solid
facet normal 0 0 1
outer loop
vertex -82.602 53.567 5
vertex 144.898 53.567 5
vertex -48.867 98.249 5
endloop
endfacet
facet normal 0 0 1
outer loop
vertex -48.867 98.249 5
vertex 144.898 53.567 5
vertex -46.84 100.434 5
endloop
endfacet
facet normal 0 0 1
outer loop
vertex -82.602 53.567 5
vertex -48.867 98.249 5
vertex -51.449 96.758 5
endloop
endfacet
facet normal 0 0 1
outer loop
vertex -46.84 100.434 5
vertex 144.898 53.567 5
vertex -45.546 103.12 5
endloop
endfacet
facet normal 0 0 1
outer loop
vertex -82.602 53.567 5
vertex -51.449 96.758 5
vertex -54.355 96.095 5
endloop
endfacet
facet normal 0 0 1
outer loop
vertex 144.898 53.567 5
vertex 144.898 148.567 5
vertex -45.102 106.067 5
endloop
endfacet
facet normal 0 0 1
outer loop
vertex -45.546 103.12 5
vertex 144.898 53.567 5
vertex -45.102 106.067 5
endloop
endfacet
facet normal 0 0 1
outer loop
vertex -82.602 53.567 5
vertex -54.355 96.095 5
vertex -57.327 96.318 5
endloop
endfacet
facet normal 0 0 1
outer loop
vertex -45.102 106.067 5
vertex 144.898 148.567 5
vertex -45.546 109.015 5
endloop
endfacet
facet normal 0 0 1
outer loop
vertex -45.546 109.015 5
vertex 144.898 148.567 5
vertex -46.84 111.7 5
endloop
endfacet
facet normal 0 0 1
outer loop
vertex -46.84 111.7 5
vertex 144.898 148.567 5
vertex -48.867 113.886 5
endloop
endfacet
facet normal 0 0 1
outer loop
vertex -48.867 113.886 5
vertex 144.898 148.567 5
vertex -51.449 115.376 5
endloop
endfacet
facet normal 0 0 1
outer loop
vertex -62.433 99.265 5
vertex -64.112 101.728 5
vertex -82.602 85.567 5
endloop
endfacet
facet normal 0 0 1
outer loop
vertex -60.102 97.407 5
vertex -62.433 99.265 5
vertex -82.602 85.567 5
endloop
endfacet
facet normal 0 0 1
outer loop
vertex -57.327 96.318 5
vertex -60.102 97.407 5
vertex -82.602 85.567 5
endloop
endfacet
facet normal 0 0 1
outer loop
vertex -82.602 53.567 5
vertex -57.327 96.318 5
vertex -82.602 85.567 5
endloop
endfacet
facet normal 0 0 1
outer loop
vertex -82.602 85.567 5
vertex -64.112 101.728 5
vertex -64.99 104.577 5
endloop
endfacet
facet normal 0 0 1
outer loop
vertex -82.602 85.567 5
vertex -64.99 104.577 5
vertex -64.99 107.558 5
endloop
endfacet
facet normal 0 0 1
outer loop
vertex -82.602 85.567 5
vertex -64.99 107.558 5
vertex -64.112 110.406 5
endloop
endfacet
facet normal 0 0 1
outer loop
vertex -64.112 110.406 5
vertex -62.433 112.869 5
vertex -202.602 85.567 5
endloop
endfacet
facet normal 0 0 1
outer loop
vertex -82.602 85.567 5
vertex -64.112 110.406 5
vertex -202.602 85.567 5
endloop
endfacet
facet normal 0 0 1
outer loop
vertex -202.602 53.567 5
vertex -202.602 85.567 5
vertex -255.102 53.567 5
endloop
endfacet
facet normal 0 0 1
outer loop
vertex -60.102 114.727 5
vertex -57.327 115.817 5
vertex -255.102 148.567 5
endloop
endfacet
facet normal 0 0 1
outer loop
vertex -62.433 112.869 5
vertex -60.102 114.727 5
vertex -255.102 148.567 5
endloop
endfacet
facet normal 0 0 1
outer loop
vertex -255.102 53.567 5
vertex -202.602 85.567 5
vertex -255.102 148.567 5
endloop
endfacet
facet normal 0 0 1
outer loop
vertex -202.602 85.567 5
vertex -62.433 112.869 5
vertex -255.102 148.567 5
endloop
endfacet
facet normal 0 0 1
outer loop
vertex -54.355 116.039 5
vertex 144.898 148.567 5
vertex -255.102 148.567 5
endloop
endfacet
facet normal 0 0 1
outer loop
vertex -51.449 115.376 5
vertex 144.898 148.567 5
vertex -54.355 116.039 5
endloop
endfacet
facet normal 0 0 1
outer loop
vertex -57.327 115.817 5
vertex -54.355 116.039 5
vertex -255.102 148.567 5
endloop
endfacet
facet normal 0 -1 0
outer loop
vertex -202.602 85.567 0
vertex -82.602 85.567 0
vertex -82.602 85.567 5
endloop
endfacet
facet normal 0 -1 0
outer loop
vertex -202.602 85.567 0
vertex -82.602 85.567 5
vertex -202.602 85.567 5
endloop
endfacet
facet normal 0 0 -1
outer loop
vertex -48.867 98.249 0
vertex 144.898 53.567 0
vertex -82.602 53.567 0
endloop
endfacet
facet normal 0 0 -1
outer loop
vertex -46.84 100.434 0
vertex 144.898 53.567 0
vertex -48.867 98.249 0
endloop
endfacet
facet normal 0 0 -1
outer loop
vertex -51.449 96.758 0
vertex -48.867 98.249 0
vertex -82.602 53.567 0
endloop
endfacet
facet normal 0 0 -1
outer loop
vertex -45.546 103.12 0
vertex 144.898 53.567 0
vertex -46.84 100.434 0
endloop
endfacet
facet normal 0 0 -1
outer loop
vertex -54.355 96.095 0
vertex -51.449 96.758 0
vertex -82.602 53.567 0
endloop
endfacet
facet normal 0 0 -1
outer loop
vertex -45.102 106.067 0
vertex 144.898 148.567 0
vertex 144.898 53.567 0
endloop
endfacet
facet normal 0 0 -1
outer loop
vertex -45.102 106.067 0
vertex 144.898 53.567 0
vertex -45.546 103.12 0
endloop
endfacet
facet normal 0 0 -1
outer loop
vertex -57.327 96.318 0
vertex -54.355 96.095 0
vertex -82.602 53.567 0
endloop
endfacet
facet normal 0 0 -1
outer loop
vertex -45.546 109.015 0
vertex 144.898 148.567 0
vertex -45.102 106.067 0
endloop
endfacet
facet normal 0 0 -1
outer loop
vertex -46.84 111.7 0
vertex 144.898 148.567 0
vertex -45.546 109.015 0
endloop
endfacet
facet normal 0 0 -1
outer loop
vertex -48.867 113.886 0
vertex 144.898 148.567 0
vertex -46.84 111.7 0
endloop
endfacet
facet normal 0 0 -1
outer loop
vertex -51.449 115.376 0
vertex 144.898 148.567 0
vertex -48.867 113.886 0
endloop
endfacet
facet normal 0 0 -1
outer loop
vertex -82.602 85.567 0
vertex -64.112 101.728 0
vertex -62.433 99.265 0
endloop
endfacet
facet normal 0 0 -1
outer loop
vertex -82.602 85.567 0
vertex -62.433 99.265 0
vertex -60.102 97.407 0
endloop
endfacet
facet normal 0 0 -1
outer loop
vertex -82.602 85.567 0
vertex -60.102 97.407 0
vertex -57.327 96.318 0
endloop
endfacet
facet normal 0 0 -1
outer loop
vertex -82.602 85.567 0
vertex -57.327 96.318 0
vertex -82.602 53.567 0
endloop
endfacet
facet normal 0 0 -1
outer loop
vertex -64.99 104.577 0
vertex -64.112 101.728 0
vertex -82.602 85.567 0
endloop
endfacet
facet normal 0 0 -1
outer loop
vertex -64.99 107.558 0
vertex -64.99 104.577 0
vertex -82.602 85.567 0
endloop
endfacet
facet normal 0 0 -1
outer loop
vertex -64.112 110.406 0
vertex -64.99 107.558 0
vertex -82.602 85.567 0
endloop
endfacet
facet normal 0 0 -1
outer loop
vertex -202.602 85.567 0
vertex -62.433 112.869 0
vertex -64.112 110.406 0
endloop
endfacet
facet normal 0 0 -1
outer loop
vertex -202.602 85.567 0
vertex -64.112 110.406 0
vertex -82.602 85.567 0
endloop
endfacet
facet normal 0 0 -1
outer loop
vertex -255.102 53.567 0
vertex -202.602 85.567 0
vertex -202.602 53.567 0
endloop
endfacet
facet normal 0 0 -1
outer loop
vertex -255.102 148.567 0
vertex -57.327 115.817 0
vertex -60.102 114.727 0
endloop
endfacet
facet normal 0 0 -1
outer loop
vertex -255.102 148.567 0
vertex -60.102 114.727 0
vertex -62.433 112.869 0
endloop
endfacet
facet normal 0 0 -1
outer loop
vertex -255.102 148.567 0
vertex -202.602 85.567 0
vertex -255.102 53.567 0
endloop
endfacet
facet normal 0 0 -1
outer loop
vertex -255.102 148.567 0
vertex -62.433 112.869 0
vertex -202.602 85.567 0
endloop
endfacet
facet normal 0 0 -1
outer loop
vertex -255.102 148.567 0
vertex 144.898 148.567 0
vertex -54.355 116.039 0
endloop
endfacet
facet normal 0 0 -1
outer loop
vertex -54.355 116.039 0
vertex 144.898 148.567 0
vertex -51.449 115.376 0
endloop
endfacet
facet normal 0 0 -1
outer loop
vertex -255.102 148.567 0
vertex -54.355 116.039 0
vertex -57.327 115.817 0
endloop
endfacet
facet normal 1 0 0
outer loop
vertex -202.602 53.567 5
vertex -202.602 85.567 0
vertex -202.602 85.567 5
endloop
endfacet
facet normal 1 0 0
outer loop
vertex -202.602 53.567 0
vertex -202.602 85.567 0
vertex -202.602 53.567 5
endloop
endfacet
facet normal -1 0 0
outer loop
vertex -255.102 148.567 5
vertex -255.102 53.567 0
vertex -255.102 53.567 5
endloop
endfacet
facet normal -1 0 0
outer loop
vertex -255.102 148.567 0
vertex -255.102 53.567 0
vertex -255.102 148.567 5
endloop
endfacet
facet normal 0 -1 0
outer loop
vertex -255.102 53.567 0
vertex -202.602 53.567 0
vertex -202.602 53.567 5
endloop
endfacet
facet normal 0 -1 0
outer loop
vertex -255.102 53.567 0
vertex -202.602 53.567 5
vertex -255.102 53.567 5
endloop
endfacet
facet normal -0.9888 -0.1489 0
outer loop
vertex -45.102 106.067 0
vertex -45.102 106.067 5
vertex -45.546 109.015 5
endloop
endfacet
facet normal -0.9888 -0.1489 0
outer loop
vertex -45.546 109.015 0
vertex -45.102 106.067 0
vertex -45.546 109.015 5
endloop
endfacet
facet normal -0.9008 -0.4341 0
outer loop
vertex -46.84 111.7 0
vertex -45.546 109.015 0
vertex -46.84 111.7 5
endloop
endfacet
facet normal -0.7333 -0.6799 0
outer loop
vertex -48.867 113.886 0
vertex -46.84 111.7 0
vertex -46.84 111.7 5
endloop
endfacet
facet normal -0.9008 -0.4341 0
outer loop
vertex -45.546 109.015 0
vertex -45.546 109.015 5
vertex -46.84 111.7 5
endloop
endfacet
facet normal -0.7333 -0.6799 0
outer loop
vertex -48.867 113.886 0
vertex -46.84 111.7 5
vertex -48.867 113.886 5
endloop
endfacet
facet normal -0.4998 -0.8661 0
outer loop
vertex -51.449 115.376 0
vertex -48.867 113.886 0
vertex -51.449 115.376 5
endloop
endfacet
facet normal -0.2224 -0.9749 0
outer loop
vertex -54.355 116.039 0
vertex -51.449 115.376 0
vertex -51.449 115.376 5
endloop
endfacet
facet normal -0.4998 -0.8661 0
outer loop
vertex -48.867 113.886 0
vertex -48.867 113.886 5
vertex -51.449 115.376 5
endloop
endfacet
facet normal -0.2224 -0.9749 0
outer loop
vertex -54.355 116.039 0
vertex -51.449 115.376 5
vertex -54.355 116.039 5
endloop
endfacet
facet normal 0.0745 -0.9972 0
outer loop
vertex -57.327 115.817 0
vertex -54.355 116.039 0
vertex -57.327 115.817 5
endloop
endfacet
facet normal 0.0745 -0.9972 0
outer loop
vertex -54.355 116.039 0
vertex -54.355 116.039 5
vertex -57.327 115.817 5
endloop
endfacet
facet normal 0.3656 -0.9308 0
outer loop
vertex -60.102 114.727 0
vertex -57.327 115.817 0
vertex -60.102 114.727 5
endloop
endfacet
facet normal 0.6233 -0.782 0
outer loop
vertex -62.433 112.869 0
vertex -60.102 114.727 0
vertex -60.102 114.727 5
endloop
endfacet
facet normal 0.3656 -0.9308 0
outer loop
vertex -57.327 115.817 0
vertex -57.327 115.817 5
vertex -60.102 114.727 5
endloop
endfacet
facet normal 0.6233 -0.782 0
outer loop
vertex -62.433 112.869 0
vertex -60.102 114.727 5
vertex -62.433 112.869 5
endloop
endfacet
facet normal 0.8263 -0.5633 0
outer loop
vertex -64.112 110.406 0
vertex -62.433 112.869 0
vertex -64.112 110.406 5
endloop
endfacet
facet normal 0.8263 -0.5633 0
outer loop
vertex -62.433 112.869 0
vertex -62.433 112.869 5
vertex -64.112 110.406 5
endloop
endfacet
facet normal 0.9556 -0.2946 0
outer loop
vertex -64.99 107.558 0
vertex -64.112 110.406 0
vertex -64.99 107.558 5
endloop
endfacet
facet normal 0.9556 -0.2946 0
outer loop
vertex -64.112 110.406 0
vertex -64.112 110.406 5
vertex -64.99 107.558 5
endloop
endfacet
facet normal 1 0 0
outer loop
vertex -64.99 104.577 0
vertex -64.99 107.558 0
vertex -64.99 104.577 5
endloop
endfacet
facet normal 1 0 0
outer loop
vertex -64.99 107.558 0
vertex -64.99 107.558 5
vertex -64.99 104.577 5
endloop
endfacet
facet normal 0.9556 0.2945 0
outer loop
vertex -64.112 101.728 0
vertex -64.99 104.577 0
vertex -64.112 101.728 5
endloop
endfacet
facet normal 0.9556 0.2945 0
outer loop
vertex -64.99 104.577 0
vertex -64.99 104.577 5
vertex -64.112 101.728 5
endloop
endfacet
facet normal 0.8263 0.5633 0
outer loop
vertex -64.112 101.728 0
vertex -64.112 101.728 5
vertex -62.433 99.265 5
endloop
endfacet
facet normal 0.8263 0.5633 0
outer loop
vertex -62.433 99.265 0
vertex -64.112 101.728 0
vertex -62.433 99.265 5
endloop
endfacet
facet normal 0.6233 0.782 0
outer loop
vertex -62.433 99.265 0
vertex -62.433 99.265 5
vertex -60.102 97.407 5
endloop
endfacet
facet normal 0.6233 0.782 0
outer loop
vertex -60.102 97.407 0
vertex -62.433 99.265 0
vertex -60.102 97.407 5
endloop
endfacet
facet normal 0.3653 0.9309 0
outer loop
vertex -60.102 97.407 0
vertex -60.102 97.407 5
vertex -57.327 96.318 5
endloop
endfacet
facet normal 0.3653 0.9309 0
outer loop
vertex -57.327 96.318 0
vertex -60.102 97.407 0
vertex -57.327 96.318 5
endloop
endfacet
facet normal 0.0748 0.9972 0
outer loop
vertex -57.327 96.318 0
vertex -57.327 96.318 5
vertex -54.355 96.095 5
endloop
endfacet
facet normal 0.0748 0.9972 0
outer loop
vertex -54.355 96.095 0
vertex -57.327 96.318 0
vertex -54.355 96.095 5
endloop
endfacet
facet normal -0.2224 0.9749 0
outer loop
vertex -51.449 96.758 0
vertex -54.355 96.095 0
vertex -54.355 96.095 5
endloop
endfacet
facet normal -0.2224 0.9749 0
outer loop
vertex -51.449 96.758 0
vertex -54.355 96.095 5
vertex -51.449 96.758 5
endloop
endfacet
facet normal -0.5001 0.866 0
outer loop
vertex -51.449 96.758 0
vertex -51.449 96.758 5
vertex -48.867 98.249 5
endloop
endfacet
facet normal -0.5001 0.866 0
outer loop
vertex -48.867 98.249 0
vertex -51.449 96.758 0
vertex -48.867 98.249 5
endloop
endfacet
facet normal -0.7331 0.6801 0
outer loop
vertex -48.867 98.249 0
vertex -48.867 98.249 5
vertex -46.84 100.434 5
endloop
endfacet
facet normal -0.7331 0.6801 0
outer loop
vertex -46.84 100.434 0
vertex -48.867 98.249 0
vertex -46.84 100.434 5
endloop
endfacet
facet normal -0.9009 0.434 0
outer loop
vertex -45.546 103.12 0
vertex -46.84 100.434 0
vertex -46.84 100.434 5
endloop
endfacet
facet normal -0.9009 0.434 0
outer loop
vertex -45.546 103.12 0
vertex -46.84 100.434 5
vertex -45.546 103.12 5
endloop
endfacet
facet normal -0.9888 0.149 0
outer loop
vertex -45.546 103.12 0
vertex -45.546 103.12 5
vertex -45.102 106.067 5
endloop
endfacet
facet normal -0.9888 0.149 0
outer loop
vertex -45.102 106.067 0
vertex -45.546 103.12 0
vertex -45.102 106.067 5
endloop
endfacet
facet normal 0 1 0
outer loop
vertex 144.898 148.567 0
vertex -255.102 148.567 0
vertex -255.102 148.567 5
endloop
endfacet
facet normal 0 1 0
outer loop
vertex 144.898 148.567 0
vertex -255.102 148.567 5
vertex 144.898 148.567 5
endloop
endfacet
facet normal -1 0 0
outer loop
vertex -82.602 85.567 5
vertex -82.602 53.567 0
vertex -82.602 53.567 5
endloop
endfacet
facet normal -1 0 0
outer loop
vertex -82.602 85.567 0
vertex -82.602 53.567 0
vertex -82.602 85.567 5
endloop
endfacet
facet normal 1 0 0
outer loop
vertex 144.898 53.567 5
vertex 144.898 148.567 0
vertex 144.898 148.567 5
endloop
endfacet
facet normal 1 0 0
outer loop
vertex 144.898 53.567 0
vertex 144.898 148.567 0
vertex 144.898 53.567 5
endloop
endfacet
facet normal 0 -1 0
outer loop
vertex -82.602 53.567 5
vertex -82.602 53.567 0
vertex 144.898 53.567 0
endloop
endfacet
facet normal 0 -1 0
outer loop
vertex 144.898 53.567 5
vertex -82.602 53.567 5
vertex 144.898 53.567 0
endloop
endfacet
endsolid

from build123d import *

# Parameters (mm, degrees)
EXTRUDE_1_DEPTH     = 5
SKETCH_2_R          = 10
CUT_EXTRUDE_1_DEPTH = 10


with BuildPart() as part:
    # 草图1 → 凸台-拉伸1 (new body)
    with BuildSketch(Plane.XY):
        Polygon((-255.102040816, 148.567224711), (144.897959184, 148.567224711), (144.897959184, 53.567224711), (92.397959184, 53.567224711), (-27.602040816, 53.567224711), (-82.602040816, 53.567224711), (-82.602040816, 85.567224711), (-202.602040816, 85.567224711), (-202.602040816, 53.567224711), (-255.102040816, 53.567224711), align=None)
    extrude(amount=EXTRUDE_1_DEPTH)

    # 草图2 → 切除-拉伸1 (cut)
    with BuildSketch(Plane.XY.offset(5)):
        with Locations((-55.102040816, 106.067224711)):
            Circle(SKETCH_2_R)
    extrude(amount=-CUT_EXTRUDE_1_DEPTH, mode=Mode.SUBTRACT)


solid = part.part
